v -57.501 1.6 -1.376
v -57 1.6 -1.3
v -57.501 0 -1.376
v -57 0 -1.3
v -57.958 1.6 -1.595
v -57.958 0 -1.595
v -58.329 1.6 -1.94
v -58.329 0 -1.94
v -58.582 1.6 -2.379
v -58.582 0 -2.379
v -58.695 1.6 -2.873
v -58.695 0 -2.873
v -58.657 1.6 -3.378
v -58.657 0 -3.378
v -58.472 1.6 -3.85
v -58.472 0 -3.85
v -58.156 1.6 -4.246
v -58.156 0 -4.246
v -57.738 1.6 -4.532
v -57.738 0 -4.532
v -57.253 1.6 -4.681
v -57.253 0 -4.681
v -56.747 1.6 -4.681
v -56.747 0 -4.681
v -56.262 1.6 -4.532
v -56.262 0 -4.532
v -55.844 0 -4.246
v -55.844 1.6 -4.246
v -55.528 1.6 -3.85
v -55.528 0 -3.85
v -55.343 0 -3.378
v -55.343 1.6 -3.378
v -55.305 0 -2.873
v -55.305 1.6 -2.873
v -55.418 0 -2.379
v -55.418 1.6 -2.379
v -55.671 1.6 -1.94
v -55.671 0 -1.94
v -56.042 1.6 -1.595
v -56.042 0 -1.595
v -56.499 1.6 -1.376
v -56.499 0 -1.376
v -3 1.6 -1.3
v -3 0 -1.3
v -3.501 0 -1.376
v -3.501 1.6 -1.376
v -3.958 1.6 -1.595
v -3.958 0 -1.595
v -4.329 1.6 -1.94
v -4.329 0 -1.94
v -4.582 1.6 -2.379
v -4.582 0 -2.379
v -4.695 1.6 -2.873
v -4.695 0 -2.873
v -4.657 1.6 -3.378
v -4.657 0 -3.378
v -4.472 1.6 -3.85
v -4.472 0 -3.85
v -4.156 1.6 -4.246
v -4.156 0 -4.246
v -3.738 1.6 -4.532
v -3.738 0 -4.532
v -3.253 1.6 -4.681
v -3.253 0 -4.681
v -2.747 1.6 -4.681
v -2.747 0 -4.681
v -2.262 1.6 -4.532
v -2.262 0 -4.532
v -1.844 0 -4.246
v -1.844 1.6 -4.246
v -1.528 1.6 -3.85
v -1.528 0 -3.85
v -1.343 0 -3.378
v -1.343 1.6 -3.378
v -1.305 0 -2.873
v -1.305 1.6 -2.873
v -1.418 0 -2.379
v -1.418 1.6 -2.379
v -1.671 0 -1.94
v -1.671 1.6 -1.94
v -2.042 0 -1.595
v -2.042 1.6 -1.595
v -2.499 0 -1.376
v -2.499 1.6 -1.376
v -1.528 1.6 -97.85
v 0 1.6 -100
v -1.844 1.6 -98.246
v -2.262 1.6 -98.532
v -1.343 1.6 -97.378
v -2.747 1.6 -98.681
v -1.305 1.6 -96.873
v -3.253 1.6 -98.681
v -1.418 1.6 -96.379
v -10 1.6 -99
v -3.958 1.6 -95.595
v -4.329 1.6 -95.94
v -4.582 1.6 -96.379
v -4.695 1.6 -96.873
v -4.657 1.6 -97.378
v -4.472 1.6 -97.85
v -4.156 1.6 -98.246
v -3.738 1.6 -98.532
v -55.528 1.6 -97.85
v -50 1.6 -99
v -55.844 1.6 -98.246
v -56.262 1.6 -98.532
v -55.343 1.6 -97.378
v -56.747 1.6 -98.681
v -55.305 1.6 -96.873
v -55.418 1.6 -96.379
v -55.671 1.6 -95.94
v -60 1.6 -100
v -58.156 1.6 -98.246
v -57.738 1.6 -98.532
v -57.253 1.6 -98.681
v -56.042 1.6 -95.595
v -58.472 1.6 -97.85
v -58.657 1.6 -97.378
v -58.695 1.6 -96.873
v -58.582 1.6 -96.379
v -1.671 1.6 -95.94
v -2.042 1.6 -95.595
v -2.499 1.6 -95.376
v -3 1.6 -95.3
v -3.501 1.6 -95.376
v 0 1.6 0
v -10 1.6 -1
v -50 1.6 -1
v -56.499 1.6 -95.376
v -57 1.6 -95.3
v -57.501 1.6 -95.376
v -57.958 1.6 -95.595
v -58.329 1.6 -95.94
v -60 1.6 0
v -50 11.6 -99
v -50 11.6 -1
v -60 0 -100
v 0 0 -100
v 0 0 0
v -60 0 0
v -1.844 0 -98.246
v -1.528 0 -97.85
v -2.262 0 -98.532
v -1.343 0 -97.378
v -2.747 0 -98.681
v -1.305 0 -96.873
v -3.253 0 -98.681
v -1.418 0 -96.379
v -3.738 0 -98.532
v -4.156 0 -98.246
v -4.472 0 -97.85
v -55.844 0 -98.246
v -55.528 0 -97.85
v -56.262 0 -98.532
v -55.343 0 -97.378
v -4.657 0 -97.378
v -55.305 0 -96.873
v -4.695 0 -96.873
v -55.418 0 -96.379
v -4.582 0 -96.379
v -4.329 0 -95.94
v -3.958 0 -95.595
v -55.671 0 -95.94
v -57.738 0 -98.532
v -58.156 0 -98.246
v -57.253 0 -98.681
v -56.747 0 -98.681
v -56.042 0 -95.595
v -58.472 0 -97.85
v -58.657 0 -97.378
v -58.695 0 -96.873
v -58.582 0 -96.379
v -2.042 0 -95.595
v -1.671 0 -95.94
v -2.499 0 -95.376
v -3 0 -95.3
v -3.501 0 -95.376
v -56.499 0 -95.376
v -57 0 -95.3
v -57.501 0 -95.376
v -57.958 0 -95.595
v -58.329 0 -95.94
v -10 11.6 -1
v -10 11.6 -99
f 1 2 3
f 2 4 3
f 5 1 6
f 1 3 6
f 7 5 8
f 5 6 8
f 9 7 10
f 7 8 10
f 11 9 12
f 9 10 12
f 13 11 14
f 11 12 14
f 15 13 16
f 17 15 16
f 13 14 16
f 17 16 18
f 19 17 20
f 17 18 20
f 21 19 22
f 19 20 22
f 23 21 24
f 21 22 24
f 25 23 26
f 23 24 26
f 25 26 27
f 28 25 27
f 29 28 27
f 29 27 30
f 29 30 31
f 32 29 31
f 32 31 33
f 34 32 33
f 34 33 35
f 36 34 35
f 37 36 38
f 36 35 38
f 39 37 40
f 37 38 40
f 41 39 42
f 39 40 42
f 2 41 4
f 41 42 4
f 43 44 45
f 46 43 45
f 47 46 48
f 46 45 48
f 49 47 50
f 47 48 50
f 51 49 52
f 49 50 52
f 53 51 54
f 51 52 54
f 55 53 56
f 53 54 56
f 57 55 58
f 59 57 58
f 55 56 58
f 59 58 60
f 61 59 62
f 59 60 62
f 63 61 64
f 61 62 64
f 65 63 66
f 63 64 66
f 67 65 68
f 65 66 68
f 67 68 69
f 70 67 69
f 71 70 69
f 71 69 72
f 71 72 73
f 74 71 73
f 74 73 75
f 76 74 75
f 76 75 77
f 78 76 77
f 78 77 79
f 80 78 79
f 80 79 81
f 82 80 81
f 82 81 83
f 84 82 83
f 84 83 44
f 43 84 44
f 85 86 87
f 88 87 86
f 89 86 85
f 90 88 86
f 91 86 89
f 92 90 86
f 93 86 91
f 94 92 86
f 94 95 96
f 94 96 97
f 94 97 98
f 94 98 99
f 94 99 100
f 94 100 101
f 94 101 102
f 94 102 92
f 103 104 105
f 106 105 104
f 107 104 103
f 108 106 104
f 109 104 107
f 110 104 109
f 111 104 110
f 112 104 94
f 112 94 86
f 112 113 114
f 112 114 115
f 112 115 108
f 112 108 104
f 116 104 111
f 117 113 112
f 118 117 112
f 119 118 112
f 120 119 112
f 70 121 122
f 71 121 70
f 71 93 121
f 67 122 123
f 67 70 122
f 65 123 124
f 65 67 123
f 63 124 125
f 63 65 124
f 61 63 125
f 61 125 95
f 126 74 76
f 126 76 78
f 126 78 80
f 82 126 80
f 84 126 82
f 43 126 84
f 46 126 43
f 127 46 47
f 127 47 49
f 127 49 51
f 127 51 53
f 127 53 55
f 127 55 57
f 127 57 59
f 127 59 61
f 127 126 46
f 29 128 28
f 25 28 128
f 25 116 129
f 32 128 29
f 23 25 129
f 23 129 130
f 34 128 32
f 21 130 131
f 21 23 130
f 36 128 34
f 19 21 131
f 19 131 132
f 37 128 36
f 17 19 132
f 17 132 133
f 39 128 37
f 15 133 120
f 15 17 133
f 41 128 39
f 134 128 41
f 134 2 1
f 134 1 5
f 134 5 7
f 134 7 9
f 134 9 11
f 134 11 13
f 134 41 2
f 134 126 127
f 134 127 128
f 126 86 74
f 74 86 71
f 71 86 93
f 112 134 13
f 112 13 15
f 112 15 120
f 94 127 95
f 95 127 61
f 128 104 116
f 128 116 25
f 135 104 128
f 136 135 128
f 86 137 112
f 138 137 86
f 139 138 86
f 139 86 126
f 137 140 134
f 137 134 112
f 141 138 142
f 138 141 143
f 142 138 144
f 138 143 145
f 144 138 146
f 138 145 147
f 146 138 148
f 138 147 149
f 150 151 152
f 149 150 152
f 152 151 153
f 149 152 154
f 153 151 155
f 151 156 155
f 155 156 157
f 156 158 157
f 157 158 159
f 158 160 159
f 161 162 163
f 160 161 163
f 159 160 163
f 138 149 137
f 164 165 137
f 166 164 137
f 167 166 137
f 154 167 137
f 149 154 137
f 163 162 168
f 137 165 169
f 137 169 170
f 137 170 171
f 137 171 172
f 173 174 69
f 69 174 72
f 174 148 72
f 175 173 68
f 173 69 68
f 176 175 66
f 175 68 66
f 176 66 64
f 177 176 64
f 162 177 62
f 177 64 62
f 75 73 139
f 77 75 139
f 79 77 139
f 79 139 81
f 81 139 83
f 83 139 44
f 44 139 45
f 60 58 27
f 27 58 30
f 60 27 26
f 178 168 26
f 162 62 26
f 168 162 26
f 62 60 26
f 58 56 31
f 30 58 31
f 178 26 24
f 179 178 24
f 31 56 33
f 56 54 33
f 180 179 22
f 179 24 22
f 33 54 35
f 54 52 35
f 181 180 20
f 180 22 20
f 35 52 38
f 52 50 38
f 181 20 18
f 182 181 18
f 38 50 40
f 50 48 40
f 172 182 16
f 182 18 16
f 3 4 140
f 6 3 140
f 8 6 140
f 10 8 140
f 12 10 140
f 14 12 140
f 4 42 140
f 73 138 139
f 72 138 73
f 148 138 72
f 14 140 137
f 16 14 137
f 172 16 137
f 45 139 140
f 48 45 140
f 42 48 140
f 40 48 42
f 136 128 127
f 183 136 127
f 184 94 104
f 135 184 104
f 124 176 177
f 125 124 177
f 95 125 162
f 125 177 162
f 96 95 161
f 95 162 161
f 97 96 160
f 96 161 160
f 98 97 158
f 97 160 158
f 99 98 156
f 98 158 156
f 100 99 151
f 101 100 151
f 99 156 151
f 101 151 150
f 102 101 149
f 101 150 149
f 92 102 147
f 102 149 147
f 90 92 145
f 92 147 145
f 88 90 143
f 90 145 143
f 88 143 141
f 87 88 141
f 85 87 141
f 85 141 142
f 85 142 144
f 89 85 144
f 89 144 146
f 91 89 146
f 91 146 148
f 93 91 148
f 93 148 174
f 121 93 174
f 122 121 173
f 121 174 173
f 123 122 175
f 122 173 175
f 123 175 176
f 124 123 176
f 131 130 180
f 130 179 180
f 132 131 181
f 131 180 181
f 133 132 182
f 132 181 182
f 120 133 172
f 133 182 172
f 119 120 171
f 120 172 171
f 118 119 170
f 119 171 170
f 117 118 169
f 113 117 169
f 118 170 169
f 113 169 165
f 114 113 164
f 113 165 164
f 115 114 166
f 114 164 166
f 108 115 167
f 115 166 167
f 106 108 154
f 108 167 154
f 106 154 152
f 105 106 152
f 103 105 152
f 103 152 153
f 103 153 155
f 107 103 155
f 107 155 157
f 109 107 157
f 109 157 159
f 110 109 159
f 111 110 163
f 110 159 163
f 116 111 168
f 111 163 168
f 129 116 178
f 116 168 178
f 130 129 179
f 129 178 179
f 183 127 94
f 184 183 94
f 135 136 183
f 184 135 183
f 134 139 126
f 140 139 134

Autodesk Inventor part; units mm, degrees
ref_plane "YZ Plane" through (0, 0, 0) normal (1, 0, 0) x (0, 1, 0)
ref_plane "XZ Plane" through (0, 0, 0) normal (0, 1, 0) x (-1, 0, 0)
sketch "Sketch1" plane through (0, 0, 0) normal (0, 1, 0) x (-1, 0, 0)
  line L0 (0, 0) -> (60, 0)
  line L1 (60, 0) -> (60, -100)
  line L2 (60, -100) -> (0, -100)
  line L3 (0, -100) -> (0, 0)
  dimension "d0" = 60
  dimension "d1" = 100
extrude "Extrusion1" add sketch "Sketch1" along normal blind 1.6
sketch "Sketch2" plane through (0, 1.6, 0) normal (0, 1, 0) x (1, 0, 0)
  line L0 (-60, 0) -> (0, 0) projected
  line L1 (0, 0) -> (0, 100) projected
  point P0 (-3, 3)
  point P1 (-57, 3)
  point P2 (-3, 97)
  point P3 (-57, 97)
  dimension "d4" = 3
  dimension "d5" = 3
  dimension "d8" = 54
  dimension "d11" = 94
hole "Hole1" at (-3, 1.6, -3) at (-57, 1.6, -3) at (-3, 1.6, -97) at (-57, 1.6, -97) direction (0, -1, 0) diameter 3.4 end through all clearance for "Flat Head Machine Screw" size "M3" standard "Ansi Metric M Profile"
sketch "Sketch3" plane through (0, 1.6, 0) normal (0, 1, 0) x (1, 0, 0)
  line L0 (0, 0) -> (-60, 0) construction
  line L1 (-30, 0) -> (-30, 100) construction
  line L2 (-60, 100) -> (0, 100) construction
  line L3 (-50, 1) -> (-10, 1)
  line L4 (-10, 1) -> (-10, 99)
  line L5 (-10, 99) -> (-50, 99)
  line L6 (-50, 99) -> (-50, 1)
  line L7 (-50, 1) -> (-10, 99) construction
  point P0 (-30, 50)
  dimension "d21" = 40
  dimension "d22" = 98
extrude "Extrusion2" add sketch "Sketch3" along normal blind 10
ref_plane "Work Plane1" through (-50, 1.6, -50) normal (0, 0, 1) x (1, 0, 0)
properties part number "LCD Screen"
